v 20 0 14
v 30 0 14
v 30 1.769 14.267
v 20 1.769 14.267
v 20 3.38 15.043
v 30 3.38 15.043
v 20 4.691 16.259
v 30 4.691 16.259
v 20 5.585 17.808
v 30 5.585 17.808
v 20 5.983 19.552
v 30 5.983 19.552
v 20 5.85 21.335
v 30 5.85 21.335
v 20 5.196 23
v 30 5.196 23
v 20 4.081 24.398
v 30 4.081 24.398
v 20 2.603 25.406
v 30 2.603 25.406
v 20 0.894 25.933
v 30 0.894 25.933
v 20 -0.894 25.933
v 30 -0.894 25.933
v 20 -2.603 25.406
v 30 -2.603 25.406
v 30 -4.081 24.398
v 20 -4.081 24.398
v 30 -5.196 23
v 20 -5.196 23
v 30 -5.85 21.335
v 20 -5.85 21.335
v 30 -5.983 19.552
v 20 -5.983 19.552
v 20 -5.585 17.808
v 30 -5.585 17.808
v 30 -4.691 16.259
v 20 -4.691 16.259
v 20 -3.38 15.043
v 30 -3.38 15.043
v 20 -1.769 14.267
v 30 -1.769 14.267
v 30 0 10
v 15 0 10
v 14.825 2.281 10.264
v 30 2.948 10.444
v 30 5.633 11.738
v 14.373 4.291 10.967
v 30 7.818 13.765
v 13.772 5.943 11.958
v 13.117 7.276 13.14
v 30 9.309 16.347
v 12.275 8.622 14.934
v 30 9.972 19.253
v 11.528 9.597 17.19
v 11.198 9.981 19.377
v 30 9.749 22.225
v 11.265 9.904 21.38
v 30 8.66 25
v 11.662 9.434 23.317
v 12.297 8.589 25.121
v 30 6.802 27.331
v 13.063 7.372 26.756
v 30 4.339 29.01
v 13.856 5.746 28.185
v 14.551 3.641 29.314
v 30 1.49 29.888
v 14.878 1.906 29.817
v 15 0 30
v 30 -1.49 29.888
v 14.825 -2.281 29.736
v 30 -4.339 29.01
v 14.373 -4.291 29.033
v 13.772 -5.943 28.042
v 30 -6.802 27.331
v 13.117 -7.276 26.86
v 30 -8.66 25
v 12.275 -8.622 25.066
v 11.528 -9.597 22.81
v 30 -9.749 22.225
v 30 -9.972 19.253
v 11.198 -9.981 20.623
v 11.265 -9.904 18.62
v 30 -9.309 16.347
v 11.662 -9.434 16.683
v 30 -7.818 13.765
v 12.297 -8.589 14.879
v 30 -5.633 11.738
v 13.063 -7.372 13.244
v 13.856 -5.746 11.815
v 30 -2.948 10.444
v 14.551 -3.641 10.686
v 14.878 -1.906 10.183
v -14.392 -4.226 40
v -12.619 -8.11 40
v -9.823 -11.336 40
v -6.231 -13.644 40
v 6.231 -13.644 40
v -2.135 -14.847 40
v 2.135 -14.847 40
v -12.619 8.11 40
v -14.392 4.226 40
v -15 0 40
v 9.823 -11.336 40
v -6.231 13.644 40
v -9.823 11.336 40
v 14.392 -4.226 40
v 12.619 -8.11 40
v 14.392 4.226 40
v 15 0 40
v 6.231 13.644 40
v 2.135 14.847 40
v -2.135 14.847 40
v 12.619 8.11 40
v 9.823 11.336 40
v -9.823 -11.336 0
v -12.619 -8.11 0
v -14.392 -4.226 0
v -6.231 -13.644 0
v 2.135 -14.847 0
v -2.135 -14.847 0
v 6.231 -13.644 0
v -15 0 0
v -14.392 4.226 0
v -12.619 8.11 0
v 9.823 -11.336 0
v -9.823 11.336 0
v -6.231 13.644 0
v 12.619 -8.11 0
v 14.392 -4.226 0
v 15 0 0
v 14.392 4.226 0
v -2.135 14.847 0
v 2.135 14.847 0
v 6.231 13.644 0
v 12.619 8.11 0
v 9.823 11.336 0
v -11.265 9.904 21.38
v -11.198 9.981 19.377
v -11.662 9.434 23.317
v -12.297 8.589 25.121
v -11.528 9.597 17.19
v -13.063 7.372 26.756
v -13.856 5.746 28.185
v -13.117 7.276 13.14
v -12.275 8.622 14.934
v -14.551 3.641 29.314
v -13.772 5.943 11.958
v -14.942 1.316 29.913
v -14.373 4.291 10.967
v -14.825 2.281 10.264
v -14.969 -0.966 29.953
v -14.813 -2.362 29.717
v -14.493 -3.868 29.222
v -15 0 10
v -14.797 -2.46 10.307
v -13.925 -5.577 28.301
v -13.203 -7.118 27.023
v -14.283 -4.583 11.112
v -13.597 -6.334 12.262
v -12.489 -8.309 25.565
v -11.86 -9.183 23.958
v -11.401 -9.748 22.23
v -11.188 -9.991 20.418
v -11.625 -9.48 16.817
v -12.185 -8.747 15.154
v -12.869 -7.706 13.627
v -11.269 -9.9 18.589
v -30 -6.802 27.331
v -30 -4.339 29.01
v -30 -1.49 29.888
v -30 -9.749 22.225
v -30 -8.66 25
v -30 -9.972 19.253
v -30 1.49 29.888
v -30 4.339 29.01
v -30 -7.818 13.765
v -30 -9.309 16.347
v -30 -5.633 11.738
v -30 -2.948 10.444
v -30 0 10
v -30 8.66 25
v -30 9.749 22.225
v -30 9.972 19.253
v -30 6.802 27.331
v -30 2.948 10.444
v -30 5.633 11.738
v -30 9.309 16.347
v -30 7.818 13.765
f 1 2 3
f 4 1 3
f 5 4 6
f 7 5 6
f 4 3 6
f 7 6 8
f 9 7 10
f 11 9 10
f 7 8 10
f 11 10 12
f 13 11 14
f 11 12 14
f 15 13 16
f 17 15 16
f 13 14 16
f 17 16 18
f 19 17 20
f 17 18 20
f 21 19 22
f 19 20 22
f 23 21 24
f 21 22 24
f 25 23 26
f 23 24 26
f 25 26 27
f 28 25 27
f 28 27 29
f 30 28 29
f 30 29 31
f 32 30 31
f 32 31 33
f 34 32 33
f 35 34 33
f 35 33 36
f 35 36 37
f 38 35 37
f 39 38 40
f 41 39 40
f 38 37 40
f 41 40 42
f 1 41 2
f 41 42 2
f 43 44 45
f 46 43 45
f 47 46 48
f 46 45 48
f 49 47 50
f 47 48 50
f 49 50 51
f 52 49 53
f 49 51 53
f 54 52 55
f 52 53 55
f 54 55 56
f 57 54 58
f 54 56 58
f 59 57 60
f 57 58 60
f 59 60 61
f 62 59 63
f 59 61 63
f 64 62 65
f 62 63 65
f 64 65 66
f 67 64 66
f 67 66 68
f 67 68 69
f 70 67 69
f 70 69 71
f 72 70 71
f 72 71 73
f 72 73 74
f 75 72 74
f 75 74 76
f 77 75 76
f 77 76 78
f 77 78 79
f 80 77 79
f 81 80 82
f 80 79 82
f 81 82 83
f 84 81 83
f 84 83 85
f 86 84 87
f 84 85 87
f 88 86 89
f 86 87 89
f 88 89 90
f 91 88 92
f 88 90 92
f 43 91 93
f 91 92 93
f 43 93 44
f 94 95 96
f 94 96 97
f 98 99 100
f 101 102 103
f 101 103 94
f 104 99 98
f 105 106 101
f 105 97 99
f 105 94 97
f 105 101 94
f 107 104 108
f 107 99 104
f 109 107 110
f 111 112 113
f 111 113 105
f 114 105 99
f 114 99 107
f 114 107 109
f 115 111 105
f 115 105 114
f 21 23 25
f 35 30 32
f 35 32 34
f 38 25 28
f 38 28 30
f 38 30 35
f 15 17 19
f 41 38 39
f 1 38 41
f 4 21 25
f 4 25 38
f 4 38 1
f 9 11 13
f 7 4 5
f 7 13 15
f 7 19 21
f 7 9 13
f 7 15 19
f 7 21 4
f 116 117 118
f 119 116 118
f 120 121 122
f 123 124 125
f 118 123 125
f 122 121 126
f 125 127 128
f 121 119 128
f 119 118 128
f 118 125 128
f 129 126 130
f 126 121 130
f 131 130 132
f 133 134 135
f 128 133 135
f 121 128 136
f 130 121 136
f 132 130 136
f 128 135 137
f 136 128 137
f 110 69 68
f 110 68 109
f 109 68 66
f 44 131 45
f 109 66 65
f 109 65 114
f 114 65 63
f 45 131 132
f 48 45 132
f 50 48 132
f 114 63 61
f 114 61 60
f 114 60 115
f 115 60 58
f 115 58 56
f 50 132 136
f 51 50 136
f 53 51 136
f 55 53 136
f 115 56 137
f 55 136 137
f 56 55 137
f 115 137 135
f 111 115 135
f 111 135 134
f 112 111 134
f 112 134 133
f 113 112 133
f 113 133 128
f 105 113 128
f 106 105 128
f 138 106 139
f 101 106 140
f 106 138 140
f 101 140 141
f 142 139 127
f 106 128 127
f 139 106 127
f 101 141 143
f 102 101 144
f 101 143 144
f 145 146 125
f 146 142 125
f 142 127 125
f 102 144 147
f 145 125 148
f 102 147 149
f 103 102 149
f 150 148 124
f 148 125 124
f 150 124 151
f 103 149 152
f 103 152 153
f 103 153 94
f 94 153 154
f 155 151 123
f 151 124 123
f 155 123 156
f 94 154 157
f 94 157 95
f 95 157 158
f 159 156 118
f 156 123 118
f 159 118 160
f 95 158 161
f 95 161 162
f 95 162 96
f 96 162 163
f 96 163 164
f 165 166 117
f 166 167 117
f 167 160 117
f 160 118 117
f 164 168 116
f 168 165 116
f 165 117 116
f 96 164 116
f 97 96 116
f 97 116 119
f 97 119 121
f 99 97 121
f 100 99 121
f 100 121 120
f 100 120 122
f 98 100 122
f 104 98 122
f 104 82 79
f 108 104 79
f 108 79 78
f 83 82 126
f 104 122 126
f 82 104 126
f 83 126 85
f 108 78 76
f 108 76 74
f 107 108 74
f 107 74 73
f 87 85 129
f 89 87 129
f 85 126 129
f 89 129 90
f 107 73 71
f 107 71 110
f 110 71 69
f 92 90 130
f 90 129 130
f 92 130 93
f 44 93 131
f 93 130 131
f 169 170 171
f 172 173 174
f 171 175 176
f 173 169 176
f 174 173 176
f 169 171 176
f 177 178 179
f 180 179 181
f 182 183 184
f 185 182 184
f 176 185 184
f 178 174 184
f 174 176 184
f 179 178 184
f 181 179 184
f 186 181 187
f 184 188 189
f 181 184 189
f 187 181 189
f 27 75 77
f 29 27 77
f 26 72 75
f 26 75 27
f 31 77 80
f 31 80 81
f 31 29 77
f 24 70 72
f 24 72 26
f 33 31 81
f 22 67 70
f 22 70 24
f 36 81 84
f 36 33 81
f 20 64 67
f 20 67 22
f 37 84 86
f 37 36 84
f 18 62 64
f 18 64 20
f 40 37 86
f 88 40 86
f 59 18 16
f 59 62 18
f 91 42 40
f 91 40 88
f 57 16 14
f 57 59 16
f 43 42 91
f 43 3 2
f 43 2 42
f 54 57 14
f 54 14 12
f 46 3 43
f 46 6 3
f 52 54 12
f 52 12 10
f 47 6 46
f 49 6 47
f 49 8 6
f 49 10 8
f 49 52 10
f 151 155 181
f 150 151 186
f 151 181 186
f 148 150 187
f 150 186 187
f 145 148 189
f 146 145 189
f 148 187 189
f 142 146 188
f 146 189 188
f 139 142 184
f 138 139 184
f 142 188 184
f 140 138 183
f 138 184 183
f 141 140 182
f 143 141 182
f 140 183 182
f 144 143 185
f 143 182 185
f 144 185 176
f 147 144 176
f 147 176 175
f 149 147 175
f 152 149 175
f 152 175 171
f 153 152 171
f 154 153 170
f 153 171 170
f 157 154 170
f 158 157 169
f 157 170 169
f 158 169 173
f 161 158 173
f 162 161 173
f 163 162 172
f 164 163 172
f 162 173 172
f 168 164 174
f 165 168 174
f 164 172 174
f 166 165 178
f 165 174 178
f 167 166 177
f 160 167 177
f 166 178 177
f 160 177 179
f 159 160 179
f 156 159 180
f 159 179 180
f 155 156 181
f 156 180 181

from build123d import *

# Parameters (mm, degrees)
SKETCH3_R                = 15
BOSS_EXTRUDE2_DEPTH      = 40
BOSS_EXTRUDE3_DEPTH      = 30
BOSS_EXTRUDE3_DEPTH_BACK = 30
SKETCH4_R                = 10
SKETCH5_OUTSIDE_W        = 57.62
SKETCH5_OUTSIDE_H        = 47.62
SKETCH5_OUTSIDE_R        = 10
SKETCH5_OUTSIDE_R_2      = 6
CUT_EXTRUDE2_DEPTH       = 10


with BuildPart() as part:
    # Sketch3 → Boss-Extrude2 (new body)
    with BuildSketch(Plane.XY):
        Circle(SKETCH3_R)
    extrude(amount=BOSS_EXTRUDE2_DEPTH)

    # Sketch4 → Boss-Extrude3 (add, two sides: drawn at the far end of the back side and taken through both)
    with BuildSketch(Plane(origin=(0, 0, 0), x_dir=(0, 0, -1), z_dir=(1, 0, 0)).offset(-BOSS_EXTRUDE3_DEPTH_BACK)):
        with Locations((-20, 0)):
            Circle(SKETCH4_R)
    extrude(amount=BOSS_EXTRUDE3_DEPTH + BOSS_EXTRUDE3_DEPTH_BACK)

    # Sketch5 outside → Cut-Extrude2 (cut)
    # profile 1 of 2: a face of its own
    with BuildSketch(Plane(origin=(30, 0, 0), x_dir=(0, 0, -1), z_dir=(1, 0, 0))):
        with Locations((-20, 0)):
            Rectangle(SKETCH5_OUTSIDE_W, SKETCH5_OUTSIDE_H)
        with Locations((-20, 0)):
            Circle(SKETCH5_OUTSIDE_R, mode=Mode.SUBTRACT)
    # profile 2 of 2: a face of its own
    with BuildSketch(Plane(origin=(30, 0, 0), x_dir=(0, 0, -1), z_dir=(1, 0, 0))):
        with Locations((-20, 0)):
            Circle(SKETCH5_OUTSIDE_R_2)
    extrude(amount=-CUT_EXTRUDE2_DEPTH, mode=Mode.SUBTRACT)


solid = part.part
